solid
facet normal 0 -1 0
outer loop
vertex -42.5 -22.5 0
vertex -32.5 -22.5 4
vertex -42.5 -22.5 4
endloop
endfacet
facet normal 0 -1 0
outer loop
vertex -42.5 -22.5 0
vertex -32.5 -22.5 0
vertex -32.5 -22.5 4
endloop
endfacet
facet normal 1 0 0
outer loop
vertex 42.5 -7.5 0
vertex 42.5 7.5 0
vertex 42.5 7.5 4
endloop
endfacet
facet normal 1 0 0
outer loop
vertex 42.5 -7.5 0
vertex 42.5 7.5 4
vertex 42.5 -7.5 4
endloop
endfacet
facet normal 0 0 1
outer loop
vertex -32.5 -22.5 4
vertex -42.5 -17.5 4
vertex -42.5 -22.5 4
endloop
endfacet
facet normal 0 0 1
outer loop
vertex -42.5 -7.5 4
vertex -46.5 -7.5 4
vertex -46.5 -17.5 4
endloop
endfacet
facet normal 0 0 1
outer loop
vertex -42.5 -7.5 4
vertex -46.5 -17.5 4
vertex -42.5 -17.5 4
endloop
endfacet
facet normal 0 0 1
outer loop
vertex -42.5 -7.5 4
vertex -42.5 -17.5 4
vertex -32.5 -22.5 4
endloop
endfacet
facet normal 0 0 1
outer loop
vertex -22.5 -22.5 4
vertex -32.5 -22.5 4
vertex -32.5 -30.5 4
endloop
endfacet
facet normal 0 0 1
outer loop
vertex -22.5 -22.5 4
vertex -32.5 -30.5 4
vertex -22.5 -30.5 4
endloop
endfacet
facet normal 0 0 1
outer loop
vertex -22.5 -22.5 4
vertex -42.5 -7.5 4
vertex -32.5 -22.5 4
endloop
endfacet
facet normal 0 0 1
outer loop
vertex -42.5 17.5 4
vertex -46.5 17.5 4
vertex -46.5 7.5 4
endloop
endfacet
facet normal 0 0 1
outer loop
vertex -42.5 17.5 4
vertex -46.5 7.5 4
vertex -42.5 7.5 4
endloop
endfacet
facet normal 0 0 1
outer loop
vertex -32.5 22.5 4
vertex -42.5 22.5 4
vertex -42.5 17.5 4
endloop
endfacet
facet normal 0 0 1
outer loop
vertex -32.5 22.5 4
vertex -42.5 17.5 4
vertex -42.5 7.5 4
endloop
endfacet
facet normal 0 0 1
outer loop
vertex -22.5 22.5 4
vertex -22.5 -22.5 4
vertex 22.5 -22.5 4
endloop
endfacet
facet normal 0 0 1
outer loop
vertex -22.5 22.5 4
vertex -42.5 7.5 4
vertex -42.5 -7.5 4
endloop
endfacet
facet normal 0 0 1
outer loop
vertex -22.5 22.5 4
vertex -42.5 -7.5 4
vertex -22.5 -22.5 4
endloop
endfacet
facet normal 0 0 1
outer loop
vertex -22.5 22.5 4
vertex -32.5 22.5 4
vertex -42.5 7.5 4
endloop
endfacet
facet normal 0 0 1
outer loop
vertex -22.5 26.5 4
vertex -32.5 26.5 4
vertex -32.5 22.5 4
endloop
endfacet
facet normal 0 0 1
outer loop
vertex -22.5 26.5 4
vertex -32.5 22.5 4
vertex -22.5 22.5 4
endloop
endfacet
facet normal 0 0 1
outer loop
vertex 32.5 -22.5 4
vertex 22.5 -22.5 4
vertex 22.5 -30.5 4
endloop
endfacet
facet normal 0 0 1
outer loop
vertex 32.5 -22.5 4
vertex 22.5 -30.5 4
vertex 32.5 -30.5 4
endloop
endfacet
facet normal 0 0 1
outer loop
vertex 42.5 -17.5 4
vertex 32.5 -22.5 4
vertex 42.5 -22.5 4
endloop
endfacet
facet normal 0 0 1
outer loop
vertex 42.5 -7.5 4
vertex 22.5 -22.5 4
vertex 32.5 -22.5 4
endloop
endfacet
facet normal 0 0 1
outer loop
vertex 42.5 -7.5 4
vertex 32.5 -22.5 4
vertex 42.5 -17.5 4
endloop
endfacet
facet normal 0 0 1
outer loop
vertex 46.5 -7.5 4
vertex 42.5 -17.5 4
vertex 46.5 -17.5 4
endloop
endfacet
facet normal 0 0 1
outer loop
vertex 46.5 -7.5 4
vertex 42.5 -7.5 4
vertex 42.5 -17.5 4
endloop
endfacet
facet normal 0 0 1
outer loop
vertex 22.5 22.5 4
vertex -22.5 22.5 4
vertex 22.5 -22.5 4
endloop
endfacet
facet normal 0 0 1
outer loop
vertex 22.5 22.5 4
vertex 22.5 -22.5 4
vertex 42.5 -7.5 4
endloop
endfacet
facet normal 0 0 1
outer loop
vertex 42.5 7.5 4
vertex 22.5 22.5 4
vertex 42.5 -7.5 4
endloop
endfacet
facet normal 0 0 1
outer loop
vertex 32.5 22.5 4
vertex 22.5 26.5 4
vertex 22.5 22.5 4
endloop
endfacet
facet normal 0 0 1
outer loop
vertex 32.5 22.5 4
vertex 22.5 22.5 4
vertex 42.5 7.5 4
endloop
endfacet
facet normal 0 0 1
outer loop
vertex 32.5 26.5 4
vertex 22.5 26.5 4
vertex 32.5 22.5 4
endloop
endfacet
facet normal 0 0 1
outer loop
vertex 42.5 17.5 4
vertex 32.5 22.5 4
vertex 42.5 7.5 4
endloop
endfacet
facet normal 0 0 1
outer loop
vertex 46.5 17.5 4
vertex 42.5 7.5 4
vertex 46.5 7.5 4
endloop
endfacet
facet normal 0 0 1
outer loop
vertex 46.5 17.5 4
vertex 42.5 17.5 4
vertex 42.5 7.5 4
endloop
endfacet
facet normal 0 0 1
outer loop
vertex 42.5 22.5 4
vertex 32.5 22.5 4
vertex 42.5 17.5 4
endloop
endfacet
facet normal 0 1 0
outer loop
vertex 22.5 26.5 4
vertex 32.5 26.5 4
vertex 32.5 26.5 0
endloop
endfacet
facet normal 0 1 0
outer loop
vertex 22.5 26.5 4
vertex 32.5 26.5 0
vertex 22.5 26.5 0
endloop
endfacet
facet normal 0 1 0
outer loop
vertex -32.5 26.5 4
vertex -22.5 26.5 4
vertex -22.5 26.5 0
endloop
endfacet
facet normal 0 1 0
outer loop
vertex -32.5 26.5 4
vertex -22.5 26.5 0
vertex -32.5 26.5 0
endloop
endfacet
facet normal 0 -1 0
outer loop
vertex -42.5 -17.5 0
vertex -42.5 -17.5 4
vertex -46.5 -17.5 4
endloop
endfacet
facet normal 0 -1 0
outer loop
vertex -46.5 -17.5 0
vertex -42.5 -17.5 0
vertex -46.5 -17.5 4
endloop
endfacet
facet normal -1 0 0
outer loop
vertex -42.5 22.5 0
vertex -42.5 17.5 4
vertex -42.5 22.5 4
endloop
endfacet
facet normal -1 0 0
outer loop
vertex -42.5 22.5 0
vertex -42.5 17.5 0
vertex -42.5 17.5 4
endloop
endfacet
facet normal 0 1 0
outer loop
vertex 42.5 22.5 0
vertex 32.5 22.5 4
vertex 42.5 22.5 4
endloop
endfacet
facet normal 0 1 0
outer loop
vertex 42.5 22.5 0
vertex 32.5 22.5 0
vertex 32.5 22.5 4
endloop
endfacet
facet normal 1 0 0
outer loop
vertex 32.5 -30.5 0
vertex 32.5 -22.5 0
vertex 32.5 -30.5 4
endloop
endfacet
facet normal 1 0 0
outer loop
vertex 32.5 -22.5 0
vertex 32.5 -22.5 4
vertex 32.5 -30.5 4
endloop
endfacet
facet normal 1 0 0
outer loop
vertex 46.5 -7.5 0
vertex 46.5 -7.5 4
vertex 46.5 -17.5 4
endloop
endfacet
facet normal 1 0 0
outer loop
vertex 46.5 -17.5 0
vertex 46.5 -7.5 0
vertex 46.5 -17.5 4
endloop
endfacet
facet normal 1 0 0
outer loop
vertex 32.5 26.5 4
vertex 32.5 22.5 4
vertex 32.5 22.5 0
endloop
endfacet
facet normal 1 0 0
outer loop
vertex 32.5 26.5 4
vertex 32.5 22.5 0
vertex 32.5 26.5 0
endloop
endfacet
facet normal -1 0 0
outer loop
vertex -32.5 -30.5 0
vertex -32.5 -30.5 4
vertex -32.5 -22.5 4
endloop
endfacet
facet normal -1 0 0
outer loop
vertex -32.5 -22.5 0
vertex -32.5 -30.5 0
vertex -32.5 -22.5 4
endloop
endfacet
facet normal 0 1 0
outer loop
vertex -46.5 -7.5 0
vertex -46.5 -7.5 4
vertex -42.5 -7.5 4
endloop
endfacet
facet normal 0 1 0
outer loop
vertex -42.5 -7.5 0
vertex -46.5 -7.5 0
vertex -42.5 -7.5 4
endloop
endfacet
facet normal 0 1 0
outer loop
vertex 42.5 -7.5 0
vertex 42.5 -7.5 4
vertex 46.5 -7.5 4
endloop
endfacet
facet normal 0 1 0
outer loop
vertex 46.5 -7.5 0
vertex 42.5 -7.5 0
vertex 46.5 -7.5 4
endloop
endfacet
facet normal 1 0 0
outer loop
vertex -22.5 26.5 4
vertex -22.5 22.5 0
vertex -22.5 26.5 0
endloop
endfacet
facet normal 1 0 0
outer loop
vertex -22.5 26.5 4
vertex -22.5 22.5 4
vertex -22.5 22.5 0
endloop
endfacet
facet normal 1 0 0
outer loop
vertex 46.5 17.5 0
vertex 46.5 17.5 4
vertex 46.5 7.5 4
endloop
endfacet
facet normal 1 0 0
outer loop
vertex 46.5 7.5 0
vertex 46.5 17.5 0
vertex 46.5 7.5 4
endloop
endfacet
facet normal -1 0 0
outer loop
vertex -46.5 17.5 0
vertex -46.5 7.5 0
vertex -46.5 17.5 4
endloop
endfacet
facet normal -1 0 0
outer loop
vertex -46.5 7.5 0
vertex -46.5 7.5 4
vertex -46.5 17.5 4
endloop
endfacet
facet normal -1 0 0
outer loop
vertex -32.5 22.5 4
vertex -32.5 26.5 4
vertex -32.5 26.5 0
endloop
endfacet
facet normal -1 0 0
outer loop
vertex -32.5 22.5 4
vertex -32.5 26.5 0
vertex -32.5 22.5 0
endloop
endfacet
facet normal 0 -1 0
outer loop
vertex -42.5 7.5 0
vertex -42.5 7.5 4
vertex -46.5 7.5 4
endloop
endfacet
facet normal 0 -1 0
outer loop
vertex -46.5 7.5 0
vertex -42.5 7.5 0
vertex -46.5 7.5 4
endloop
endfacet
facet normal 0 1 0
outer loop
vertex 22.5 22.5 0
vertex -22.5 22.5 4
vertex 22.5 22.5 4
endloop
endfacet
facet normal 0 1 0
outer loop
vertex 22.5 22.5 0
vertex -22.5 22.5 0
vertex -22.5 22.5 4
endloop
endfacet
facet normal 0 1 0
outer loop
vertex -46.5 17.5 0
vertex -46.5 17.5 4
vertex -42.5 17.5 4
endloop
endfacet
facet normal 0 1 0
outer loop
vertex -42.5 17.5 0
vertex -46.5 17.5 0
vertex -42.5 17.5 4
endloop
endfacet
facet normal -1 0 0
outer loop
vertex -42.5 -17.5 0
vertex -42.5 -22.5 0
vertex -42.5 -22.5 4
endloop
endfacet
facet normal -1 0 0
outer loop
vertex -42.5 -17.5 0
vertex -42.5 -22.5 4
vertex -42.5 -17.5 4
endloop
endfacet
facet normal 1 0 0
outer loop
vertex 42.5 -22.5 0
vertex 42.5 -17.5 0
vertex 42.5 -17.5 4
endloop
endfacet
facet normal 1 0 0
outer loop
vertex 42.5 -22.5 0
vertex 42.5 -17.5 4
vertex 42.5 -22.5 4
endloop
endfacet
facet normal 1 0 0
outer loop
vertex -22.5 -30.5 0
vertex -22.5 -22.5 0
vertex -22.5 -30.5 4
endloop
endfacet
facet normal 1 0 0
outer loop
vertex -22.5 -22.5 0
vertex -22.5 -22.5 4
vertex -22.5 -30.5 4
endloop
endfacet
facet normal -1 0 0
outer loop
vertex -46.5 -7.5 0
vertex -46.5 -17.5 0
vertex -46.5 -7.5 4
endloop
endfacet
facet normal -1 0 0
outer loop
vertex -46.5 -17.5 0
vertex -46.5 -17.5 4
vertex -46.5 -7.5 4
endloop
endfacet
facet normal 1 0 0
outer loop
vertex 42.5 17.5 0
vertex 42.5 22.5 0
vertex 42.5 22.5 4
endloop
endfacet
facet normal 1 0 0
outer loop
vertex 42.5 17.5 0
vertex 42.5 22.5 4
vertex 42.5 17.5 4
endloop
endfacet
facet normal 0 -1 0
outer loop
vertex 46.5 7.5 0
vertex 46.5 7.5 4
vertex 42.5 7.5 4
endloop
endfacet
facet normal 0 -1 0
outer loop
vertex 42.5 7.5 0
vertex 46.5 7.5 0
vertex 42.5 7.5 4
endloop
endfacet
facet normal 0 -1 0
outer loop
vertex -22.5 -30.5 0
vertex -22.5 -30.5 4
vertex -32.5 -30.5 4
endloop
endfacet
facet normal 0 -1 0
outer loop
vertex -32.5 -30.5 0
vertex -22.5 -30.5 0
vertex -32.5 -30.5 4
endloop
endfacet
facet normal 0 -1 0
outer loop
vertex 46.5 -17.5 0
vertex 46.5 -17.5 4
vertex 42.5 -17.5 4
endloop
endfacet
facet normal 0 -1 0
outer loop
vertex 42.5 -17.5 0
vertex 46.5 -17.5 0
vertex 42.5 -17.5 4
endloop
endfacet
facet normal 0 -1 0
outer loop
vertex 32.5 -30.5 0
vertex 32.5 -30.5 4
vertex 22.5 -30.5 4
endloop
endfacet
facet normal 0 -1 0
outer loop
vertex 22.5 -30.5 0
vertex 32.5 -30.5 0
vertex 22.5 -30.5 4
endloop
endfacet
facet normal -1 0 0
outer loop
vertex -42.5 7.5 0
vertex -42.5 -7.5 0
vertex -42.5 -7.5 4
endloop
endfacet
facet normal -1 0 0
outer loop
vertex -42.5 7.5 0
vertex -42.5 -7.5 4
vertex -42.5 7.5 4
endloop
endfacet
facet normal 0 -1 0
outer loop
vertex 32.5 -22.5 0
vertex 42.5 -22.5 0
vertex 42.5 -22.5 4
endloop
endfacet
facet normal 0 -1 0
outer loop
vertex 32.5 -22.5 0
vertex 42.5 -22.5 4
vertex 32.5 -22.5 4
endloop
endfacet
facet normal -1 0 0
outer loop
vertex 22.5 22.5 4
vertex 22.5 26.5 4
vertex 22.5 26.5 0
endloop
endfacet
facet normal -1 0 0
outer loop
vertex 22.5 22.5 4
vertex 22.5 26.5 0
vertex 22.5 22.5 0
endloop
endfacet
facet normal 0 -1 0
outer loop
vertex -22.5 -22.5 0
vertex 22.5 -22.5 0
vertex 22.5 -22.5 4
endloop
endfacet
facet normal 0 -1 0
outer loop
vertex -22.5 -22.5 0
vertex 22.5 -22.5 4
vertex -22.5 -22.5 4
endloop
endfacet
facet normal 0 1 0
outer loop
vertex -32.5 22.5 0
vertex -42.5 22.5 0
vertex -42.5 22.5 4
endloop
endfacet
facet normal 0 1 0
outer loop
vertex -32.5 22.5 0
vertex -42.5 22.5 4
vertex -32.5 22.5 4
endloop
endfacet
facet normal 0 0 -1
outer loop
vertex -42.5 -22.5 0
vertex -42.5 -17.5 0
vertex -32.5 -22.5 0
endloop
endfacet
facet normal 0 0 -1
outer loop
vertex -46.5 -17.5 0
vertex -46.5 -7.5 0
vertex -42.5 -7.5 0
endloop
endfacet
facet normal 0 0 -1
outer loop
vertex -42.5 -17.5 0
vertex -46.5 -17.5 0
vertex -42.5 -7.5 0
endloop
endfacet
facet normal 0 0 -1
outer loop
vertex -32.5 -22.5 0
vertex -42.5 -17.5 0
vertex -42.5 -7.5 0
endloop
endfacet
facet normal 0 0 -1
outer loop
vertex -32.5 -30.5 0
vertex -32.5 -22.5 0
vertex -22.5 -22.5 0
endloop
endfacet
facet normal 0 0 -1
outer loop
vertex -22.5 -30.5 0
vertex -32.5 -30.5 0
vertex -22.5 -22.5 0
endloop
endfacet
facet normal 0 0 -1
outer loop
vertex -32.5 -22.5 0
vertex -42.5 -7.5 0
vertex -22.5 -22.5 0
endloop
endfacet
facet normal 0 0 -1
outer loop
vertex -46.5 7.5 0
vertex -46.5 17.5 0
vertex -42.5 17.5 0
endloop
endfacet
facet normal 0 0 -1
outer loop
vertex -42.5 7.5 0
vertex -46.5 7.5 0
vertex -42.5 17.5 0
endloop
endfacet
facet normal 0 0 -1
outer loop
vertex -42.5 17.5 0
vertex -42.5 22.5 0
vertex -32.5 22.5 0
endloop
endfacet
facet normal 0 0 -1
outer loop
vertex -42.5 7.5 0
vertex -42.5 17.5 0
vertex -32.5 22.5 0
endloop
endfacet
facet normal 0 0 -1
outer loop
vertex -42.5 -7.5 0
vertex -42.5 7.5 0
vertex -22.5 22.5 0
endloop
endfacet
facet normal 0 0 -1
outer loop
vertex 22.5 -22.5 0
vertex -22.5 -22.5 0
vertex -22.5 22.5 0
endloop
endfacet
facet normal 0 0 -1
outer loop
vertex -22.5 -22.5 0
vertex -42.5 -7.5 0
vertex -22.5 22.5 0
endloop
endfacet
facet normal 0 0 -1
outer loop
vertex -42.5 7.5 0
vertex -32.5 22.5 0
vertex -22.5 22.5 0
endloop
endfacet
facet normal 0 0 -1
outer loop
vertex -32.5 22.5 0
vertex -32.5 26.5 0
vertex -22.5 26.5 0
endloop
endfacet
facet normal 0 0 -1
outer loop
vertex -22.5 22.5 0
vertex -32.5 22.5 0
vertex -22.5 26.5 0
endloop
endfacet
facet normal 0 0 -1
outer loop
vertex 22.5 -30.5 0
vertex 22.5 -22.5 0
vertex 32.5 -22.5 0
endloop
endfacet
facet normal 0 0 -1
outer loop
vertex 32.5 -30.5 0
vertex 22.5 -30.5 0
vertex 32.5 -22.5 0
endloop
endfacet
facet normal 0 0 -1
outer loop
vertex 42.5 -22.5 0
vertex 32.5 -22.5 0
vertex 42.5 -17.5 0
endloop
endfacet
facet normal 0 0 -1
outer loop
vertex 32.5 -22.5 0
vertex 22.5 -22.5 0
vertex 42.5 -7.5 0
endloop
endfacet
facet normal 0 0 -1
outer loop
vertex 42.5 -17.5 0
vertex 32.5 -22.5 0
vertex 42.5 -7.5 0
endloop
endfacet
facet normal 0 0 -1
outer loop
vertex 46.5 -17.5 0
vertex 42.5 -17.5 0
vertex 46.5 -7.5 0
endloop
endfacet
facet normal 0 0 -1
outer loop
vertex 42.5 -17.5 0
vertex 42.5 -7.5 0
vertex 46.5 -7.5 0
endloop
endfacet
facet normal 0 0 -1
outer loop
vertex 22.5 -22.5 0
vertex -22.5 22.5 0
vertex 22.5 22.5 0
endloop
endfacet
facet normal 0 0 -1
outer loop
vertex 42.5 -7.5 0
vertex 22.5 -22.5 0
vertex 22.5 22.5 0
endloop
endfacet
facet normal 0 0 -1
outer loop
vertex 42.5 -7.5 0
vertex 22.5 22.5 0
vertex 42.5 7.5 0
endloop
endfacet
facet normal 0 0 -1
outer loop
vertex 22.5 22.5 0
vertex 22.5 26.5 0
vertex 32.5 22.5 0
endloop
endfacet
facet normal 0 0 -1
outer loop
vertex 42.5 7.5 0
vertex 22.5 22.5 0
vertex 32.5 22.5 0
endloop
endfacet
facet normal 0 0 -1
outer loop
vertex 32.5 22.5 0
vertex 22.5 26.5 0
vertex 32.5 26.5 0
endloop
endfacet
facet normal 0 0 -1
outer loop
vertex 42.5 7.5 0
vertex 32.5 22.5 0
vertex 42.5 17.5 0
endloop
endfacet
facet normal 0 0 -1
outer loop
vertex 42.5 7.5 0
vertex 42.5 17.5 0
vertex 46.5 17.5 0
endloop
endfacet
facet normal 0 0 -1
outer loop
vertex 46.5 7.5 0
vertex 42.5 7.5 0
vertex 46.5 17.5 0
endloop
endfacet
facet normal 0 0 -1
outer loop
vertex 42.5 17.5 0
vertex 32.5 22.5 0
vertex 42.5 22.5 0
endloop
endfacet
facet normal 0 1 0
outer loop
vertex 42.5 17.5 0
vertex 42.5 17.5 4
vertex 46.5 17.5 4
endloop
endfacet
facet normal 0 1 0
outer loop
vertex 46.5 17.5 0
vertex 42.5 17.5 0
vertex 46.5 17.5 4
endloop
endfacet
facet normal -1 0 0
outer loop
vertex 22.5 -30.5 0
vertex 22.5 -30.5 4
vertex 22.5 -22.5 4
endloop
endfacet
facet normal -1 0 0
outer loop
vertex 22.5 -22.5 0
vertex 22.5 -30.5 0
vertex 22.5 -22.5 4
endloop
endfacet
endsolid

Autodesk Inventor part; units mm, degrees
ref_plane "YZ Plane" through (0, 0, 0) normal (1, 0, 0) x (0, 1, 0)
ref_plane "XZ Plane" through (0, 0, 0) normal (0, 1, 0) x (-1, 0, 0)
sketch "Sketch1" plane through (0, 0, 0) normal (0, 0, 1) x (1, 0, 0)
  line L0 (42.5, -22.5) -> (-42.5, -22.5)
  line L1 (-42.5, -22.5) -> (-42.5, 22.5)
  line L2 (-42.5, 22.5) -> (42.5, 22.5)
  line L3 (42.5, 22.5) -> (42.5, -22.5)
  line L4 (42.5, -22.5) -> (-42.5, 22.5) construction
  line L5 (-42.5, -22.5) -> (42.5, 22.5) construction
  point P0 (0, 0)
  dimension "d0" = 85
  dimension "d1" = 45
extrude "Extrusion1" add sketch "Sketch1" along normal blind 4
sketch "Sketch2" plane through (0, 0, 4) normal (0, 0, 1) x (1, 0, 0)
  line L0 (-42.5, -22.5) -> (42.5, -22.5) projected
  line L1 (42.5, -22.5) -> (42.5, 22.5) projected
  line L2 (42.5, 22.5) -> (-42.5, 22.5) projected
  line L3 (-42.5, 22.5) -> (-42.5, -22.5) projected
  line L4 (42.5, 17.5) -> (46.5, 17.5)
  line L5 (46.5, 17.5) -> (46.5, 7.5)
  line L6 (46.5, 7.5) -> (42.5, 7.5)
  line L7 (42.5, 7.5) -> (42.5, 17.5)
  line L8 (42.5, -22.5) -> (42.5, 22.5) projected
  line L9 (42.5, -7.5) -> (46.5, -7.5)
  line L10 (46.5, -7.5) -> (46.5, -17.5)
  line L11 (46.5, -17.5) -> (42.5, -17.5)
  line L12 (42.5, -17.5) -> (42.5, -7.5)
  point P0 (0, 0)
  dimension "d4" = 4
  dimension "d5" = 10
  dimension "d6" = 10
extrude "Extrusion2" add sketch "Sketch2" against normal blind 4 contours L1 L9 L10 L11 | L4 L5 L6 L1
ref_plane "Work Plane1" through (0, -7.5, 0) normal (1, 0, 0) x (0, 0, -1)
mirror "Mirror1" about plane through (0, -7.5, 0) normal (1, 0, 0) of "Extrusion2"
sketch "Sketch3" plane through (0, 0, 4) normal (0, 0, 1) x (1, 0, 0)
  line L0 (-42.5, -22.5) -> (42.5, -22.5) projected
  line L1 (-32.5, -22.5) -> (-22.5, -22.5)
  line L2 (-22.5, -22.5) -> (-22.5, -30.5)
  line L3 (-22.5, -30.5) -> (-32.5, -30.5)
  line L4 (-32.5, -30.5) -> (-32.5, -22.5)
  line L5 (22.5, -22.5) -> (32.5, -22.5)
  line L6 (32.5, -22.5) -> (32.5, -30.5)
  line L7 (32.5, -30.5) -> (22.5, -30.5)
  line L8 (22.5, -30.5) -> (22.5, -22.5)
  line L9 (-42.5, -17.5) -> (-42.5, -22.5) projected
  line L10 (42.5, -22.5) -> (42.5, -17.5) projected
  point P0 (0, 0)
  dimension "d11" = 10
  dimension "d12" = 8
  dimension "d13" = 10
  dimension "d14" = 8
extrude "Extrusion3" add sketch "Sketch3" against normal blind 4
sketch "Sketch4" plane through (0, 0, 4) normal (0, 0, 1) x (1, 0, 0)
  line L0 (42.5, 22.5) -> (-42.5, 22.5) projected
  line L1 (-32.5, 22.5) -> (-22.5, 22.5)
  line L2 (-22.5, 22.5) -> (-22.5, 26.5)
  line L3 (-22.5, 26.5) -> (-32.5, 26.5)
  line L4 (-32.5, 26.5) -> (-32.5, 22.5)
  line L5 (22.5, 22.5) -> (32.5, 22.5)
  line L6 (32.5, 22.5) -> (32.5, 26.5)
  line L7 (32.5, 26.5) -> (22.5, 26.5)
  line L8 (22.5, 26.5) -> (22.5, 22.5)
  line L9 (-42.5, 22.5) -> (-42.5, 17.5) projected
  line L10 (42.5, 17.5) -> (42.5, 22.5) projected
  point P0 (0, 0)
  dimension "d20" = 10
  dimension "d21" = 4
  dimension "d22" = 10
  dimension "d23" = 4
extrude "Extrusion4" add sketch "Sketch4" against normal blind 4
equation "\"d5\" = D"
equation "\"d6\" = D"
equation "\"d11\" = D"
equation "\"d13\" = D"
equation "\"d20\" = D"
equation "\"d22\" = D"
equation "\"D\" = 10"
properties part number "FUENTE 3"
